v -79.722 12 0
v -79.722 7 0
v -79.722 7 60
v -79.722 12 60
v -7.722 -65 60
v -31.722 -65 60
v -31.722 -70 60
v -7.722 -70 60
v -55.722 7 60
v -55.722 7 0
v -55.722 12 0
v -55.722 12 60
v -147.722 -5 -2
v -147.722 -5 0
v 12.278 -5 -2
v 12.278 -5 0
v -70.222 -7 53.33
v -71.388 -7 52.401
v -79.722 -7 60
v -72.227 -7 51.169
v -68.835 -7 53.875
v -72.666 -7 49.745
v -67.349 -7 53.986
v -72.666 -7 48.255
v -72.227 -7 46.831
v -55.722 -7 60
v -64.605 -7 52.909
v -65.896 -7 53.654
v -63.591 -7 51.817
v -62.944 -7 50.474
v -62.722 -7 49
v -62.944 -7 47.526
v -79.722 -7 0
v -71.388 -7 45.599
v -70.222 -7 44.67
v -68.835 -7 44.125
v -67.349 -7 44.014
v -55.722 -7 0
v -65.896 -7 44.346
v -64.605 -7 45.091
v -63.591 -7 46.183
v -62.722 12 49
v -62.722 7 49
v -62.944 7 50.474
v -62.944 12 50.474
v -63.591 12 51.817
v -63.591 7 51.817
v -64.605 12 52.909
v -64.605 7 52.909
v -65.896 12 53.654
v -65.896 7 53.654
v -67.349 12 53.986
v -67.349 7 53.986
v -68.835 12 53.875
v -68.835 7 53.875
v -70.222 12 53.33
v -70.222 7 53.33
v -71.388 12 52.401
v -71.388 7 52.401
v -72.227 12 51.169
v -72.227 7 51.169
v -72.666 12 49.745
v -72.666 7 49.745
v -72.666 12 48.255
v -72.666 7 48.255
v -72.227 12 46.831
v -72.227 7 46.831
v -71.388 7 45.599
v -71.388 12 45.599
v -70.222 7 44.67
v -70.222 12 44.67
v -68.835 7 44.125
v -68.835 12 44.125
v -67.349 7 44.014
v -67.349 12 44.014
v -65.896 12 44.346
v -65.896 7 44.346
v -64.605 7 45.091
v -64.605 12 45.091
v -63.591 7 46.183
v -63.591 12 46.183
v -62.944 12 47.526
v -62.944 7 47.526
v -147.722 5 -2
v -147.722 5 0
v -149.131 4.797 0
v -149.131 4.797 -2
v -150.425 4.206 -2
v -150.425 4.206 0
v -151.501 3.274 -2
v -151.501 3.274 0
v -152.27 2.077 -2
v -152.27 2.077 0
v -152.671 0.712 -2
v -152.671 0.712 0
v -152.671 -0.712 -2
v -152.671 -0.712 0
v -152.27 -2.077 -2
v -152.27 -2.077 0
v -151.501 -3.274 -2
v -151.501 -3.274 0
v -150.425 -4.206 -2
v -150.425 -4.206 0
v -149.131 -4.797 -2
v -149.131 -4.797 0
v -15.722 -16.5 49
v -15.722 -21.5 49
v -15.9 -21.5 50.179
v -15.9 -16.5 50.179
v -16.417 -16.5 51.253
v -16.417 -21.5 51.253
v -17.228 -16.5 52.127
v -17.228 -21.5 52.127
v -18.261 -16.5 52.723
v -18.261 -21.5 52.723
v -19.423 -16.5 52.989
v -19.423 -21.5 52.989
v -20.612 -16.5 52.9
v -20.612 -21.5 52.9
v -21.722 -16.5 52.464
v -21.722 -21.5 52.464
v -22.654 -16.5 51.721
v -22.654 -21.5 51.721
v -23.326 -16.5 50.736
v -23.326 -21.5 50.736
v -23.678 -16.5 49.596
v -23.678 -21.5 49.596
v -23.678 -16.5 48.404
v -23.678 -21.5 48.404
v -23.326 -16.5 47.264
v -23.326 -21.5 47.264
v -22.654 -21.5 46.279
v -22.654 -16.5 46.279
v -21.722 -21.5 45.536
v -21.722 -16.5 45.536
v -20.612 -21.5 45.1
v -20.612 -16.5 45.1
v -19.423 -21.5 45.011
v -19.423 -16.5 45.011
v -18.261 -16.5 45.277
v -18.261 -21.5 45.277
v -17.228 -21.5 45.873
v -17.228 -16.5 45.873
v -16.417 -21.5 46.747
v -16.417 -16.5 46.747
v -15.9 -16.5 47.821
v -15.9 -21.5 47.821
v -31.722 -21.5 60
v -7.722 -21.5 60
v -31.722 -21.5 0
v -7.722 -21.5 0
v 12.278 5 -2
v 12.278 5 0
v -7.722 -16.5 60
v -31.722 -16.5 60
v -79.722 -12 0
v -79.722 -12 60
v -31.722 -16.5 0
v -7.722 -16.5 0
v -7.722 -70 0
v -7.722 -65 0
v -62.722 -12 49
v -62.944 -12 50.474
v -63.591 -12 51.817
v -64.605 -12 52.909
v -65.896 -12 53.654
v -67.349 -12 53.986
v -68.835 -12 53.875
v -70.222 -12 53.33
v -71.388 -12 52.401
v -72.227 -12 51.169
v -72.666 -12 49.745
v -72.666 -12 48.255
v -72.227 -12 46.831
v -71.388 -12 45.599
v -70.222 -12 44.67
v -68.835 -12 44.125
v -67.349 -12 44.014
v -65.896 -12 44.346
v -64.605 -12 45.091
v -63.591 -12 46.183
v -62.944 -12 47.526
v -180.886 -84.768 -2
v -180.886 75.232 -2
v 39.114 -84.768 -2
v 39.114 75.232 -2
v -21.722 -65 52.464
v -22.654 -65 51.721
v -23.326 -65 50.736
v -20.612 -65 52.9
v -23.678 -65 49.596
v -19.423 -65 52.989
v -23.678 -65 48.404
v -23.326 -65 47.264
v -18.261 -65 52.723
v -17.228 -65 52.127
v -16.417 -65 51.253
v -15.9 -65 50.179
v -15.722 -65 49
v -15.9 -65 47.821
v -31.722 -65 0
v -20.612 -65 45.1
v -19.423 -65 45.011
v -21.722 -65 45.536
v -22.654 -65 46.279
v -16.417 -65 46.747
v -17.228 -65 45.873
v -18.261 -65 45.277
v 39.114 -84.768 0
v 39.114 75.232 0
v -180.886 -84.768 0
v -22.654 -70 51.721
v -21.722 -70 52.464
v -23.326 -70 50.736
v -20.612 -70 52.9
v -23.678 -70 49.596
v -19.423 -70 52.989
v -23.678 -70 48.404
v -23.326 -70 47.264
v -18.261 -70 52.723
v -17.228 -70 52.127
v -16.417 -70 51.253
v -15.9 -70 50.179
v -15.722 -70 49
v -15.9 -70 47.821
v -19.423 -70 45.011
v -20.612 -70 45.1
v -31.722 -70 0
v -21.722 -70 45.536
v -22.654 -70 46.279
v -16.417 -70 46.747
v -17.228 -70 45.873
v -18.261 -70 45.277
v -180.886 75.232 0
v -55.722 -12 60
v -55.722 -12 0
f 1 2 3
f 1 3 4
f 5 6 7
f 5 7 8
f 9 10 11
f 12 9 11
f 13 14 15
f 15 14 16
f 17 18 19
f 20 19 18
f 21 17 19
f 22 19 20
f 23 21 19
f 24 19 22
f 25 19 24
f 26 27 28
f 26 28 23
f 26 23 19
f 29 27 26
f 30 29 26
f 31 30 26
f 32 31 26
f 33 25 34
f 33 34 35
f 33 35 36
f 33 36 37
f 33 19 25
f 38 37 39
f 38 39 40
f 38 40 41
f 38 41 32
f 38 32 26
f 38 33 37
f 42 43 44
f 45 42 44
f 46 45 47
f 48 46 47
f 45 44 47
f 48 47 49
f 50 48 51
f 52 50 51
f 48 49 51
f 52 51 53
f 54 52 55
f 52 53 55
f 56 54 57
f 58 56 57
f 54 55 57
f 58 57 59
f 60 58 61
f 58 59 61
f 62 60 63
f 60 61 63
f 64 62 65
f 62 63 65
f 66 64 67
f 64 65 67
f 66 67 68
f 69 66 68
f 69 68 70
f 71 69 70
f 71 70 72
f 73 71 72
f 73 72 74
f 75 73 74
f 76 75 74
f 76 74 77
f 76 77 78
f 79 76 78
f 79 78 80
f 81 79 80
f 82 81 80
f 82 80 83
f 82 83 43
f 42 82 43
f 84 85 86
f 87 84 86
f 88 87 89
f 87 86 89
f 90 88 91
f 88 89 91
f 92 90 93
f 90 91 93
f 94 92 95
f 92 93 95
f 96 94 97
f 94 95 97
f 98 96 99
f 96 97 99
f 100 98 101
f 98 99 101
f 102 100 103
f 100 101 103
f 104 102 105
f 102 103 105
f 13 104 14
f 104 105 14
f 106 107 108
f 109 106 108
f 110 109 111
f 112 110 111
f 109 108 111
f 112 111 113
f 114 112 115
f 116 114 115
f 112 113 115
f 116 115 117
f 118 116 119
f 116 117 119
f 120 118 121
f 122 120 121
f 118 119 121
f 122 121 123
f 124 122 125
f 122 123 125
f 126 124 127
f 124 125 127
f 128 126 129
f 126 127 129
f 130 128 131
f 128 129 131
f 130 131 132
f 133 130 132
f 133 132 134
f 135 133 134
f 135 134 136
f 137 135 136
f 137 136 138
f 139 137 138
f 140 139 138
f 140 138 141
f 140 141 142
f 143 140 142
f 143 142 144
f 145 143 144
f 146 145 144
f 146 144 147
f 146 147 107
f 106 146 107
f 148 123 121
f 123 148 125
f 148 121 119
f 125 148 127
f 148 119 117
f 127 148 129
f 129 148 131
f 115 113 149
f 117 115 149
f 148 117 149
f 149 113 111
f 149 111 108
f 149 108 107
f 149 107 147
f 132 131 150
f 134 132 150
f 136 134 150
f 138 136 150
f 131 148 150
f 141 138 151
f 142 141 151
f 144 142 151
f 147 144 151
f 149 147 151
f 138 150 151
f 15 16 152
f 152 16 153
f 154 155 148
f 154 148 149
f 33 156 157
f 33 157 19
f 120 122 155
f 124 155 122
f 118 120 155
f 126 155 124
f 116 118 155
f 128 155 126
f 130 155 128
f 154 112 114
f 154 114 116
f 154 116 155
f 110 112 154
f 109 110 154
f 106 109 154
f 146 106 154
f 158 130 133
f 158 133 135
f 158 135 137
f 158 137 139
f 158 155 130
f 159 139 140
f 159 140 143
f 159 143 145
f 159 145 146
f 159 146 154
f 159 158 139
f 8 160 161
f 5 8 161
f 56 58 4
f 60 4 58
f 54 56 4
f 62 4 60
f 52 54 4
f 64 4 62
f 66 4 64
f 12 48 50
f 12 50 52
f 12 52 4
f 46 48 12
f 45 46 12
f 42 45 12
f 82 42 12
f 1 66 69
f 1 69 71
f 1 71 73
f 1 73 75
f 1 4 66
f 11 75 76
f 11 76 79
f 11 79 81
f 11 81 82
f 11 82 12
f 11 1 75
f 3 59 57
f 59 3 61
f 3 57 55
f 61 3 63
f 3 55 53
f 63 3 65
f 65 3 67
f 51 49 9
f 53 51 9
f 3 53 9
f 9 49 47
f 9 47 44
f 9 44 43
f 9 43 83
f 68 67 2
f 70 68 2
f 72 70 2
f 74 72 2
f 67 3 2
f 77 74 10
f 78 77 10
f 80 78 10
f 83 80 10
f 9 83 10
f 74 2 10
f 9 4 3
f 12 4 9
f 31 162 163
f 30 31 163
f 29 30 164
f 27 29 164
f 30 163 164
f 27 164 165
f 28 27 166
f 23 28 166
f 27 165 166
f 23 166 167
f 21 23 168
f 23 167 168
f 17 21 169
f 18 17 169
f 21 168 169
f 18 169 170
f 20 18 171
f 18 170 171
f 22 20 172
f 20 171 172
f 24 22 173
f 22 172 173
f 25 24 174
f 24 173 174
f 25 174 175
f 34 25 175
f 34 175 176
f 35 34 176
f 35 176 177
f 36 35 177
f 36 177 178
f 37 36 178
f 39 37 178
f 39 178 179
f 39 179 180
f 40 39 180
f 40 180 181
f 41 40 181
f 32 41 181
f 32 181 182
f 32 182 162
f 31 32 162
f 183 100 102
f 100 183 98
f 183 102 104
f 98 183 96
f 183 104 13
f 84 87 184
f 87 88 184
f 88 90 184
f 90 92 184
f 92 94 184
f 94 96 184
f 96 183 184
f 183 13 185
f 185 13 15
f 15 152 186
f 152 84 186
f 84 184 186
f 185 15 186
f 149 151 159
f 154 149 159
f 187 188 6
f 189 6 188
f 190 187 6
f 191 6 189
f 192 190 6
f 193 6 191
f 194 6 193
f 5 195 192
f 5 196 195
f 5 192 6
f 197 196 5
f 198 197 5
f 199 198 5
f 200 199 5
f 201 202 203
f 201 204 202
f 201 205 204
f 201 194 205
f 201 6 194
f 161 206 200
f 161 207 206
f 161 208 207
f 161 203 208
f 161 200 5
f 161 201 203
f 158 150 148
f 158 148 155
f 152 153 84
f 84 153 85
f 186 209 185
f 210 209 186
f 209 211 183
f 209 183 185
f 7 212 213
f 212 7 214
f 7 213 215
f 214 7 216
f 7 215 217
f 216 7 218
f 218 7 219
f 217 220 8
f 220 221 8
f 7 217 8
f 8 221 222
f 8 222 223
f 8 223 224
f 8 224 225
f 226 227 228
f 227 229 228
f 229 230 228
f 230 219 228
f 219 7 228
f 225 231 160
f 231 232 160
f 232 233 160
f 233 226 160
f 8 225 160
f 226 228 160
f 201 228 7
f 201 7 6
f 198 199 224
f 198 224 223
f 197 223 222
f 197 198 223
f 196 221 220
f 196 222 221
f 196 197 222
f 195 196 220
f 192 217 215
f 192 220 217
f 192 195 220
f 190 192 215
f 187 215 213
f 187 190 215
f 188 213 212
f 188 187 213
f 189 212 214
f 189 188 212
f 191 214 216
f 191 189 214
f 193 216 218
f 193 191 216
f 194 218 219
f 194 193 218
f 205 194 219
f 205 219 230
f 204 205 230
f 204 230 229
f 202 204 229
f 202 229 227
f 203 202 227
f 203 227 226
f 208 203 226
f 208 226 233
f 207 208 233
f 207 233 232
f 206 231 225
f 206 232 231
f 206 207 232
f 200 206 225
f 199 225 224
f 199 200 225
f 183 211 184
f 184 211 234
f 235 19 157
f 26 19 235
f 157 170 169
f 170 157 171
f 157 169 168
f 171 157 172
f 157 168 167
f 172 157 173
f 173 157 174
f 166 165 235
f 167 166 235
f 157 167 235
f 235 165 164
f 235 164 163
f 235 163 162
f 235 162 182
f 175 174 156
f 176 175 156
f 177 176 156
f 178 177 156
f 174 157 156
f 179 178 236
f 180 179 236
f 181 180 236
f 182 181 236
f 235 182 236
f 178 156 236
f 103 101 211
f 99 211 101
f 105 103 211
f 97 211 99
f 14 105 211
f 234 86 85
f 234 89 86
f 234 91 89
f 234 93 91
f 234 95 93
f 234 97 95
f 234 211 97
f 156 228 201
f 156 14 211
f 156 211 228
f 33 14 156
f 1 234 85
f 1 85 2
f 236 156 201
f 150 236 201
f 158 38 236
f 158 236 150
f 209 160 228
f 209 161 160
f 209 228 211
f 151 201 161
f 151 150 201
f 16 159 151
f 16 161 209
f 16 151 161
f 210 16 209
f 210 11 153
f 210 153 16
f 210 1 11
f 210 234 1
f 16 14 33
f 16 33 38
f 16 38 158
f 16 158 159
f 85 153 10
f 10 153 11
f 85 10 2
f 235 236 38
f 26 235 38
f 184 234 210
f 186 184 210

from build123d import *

# Parameters (mm, degrees)
F0_W      = 220
F0_H      = 160
F1_DEPTH  = 2
F3_DEPTH  = 25
F4_W      = 24
F4_H      = 5
F5_DEPTH  = 60
F6_R      = 5
F7_DEPTH  = 25
F8_W      = 24
F8_H      = 5
F9_DEPTH  = 60
F10_R     = 4
F11_DEPTH = 25
F12_DEPTH = 100


with BuildPart() as f1:
    # F0 (on Top) → F1 (new body)
    with BuildSketch(Plane.XY):
        with Locations((-70.886021, -4.76821)):
            Rectangle(F0_W, F0_H)
    extrude(amount=-F1_DEPTH)

    # F2 (on face) → F3 (cut)
    with BuildSketch(Plane.XY):
        with BuildLine():
            Line((12.277737, -5), (12.277737, 5))
            Line((12.277737, 5), (-147.722263, 5))
            ThreePointArc((-147.722263, 5), (-152.722263, 0), (-147.722263, -5))
            Line((-147.722263, -5), (12.277737, -5))
        make_face()
    extrude(amount=-F3_DEPTH, mode=Mode.SUBTRACT)

    # F4 (on face) → F5 (join)
    with BuildSketch(Plane.XY):
        with Locations((-67.722263, -9.5)):
            Rectangle(F4_W, F4_H)
        with Locations((-67.722263, 9.5)):
            Rectangle(F4_W, F4_H)
    extrude(amount=F5_DEPTH)

    # F6 (on face) → F7 (cut)
    with BuildSketch(Plane.XZ.offset(12)):
        with Locations((-67.722263, 49)):
            Circle(F6_R)
    extrude(amount=-F7_DEPTH, mode=Mode.SUBTRACT)

    # F8 (on face) → F9 (join)
    with BuildSketch(Plane.XY):
        with Locations((-19.722263, -19)):
            Rectangle(F8_W, F8_H)
        with Locations((-19.722263, -67.5)):
            Rectangle(F8_W, F8_H)
    extrude(amount=F9_DEPTH)

    # F10 (on face) → F11 (cut)
    with BuildSketch(Plane.XZ.offset(21.5)):
        with Locations((-19.722263, 49)):
            Circle(F10_R)
    extrude(amount=-F11_DEPTH, mode=Mode.SUBTRACT)

    # F10 (on face) → F12 (cut)
    with BuildSketch(Plane.XZ.offset(21.5)):
        with Locations((-19.722263, 49)):
            Circle(F10_R)
    extrude(amount=F12_DEPTH, mode=Mode.SUBTRACT)


solid = f1.part
